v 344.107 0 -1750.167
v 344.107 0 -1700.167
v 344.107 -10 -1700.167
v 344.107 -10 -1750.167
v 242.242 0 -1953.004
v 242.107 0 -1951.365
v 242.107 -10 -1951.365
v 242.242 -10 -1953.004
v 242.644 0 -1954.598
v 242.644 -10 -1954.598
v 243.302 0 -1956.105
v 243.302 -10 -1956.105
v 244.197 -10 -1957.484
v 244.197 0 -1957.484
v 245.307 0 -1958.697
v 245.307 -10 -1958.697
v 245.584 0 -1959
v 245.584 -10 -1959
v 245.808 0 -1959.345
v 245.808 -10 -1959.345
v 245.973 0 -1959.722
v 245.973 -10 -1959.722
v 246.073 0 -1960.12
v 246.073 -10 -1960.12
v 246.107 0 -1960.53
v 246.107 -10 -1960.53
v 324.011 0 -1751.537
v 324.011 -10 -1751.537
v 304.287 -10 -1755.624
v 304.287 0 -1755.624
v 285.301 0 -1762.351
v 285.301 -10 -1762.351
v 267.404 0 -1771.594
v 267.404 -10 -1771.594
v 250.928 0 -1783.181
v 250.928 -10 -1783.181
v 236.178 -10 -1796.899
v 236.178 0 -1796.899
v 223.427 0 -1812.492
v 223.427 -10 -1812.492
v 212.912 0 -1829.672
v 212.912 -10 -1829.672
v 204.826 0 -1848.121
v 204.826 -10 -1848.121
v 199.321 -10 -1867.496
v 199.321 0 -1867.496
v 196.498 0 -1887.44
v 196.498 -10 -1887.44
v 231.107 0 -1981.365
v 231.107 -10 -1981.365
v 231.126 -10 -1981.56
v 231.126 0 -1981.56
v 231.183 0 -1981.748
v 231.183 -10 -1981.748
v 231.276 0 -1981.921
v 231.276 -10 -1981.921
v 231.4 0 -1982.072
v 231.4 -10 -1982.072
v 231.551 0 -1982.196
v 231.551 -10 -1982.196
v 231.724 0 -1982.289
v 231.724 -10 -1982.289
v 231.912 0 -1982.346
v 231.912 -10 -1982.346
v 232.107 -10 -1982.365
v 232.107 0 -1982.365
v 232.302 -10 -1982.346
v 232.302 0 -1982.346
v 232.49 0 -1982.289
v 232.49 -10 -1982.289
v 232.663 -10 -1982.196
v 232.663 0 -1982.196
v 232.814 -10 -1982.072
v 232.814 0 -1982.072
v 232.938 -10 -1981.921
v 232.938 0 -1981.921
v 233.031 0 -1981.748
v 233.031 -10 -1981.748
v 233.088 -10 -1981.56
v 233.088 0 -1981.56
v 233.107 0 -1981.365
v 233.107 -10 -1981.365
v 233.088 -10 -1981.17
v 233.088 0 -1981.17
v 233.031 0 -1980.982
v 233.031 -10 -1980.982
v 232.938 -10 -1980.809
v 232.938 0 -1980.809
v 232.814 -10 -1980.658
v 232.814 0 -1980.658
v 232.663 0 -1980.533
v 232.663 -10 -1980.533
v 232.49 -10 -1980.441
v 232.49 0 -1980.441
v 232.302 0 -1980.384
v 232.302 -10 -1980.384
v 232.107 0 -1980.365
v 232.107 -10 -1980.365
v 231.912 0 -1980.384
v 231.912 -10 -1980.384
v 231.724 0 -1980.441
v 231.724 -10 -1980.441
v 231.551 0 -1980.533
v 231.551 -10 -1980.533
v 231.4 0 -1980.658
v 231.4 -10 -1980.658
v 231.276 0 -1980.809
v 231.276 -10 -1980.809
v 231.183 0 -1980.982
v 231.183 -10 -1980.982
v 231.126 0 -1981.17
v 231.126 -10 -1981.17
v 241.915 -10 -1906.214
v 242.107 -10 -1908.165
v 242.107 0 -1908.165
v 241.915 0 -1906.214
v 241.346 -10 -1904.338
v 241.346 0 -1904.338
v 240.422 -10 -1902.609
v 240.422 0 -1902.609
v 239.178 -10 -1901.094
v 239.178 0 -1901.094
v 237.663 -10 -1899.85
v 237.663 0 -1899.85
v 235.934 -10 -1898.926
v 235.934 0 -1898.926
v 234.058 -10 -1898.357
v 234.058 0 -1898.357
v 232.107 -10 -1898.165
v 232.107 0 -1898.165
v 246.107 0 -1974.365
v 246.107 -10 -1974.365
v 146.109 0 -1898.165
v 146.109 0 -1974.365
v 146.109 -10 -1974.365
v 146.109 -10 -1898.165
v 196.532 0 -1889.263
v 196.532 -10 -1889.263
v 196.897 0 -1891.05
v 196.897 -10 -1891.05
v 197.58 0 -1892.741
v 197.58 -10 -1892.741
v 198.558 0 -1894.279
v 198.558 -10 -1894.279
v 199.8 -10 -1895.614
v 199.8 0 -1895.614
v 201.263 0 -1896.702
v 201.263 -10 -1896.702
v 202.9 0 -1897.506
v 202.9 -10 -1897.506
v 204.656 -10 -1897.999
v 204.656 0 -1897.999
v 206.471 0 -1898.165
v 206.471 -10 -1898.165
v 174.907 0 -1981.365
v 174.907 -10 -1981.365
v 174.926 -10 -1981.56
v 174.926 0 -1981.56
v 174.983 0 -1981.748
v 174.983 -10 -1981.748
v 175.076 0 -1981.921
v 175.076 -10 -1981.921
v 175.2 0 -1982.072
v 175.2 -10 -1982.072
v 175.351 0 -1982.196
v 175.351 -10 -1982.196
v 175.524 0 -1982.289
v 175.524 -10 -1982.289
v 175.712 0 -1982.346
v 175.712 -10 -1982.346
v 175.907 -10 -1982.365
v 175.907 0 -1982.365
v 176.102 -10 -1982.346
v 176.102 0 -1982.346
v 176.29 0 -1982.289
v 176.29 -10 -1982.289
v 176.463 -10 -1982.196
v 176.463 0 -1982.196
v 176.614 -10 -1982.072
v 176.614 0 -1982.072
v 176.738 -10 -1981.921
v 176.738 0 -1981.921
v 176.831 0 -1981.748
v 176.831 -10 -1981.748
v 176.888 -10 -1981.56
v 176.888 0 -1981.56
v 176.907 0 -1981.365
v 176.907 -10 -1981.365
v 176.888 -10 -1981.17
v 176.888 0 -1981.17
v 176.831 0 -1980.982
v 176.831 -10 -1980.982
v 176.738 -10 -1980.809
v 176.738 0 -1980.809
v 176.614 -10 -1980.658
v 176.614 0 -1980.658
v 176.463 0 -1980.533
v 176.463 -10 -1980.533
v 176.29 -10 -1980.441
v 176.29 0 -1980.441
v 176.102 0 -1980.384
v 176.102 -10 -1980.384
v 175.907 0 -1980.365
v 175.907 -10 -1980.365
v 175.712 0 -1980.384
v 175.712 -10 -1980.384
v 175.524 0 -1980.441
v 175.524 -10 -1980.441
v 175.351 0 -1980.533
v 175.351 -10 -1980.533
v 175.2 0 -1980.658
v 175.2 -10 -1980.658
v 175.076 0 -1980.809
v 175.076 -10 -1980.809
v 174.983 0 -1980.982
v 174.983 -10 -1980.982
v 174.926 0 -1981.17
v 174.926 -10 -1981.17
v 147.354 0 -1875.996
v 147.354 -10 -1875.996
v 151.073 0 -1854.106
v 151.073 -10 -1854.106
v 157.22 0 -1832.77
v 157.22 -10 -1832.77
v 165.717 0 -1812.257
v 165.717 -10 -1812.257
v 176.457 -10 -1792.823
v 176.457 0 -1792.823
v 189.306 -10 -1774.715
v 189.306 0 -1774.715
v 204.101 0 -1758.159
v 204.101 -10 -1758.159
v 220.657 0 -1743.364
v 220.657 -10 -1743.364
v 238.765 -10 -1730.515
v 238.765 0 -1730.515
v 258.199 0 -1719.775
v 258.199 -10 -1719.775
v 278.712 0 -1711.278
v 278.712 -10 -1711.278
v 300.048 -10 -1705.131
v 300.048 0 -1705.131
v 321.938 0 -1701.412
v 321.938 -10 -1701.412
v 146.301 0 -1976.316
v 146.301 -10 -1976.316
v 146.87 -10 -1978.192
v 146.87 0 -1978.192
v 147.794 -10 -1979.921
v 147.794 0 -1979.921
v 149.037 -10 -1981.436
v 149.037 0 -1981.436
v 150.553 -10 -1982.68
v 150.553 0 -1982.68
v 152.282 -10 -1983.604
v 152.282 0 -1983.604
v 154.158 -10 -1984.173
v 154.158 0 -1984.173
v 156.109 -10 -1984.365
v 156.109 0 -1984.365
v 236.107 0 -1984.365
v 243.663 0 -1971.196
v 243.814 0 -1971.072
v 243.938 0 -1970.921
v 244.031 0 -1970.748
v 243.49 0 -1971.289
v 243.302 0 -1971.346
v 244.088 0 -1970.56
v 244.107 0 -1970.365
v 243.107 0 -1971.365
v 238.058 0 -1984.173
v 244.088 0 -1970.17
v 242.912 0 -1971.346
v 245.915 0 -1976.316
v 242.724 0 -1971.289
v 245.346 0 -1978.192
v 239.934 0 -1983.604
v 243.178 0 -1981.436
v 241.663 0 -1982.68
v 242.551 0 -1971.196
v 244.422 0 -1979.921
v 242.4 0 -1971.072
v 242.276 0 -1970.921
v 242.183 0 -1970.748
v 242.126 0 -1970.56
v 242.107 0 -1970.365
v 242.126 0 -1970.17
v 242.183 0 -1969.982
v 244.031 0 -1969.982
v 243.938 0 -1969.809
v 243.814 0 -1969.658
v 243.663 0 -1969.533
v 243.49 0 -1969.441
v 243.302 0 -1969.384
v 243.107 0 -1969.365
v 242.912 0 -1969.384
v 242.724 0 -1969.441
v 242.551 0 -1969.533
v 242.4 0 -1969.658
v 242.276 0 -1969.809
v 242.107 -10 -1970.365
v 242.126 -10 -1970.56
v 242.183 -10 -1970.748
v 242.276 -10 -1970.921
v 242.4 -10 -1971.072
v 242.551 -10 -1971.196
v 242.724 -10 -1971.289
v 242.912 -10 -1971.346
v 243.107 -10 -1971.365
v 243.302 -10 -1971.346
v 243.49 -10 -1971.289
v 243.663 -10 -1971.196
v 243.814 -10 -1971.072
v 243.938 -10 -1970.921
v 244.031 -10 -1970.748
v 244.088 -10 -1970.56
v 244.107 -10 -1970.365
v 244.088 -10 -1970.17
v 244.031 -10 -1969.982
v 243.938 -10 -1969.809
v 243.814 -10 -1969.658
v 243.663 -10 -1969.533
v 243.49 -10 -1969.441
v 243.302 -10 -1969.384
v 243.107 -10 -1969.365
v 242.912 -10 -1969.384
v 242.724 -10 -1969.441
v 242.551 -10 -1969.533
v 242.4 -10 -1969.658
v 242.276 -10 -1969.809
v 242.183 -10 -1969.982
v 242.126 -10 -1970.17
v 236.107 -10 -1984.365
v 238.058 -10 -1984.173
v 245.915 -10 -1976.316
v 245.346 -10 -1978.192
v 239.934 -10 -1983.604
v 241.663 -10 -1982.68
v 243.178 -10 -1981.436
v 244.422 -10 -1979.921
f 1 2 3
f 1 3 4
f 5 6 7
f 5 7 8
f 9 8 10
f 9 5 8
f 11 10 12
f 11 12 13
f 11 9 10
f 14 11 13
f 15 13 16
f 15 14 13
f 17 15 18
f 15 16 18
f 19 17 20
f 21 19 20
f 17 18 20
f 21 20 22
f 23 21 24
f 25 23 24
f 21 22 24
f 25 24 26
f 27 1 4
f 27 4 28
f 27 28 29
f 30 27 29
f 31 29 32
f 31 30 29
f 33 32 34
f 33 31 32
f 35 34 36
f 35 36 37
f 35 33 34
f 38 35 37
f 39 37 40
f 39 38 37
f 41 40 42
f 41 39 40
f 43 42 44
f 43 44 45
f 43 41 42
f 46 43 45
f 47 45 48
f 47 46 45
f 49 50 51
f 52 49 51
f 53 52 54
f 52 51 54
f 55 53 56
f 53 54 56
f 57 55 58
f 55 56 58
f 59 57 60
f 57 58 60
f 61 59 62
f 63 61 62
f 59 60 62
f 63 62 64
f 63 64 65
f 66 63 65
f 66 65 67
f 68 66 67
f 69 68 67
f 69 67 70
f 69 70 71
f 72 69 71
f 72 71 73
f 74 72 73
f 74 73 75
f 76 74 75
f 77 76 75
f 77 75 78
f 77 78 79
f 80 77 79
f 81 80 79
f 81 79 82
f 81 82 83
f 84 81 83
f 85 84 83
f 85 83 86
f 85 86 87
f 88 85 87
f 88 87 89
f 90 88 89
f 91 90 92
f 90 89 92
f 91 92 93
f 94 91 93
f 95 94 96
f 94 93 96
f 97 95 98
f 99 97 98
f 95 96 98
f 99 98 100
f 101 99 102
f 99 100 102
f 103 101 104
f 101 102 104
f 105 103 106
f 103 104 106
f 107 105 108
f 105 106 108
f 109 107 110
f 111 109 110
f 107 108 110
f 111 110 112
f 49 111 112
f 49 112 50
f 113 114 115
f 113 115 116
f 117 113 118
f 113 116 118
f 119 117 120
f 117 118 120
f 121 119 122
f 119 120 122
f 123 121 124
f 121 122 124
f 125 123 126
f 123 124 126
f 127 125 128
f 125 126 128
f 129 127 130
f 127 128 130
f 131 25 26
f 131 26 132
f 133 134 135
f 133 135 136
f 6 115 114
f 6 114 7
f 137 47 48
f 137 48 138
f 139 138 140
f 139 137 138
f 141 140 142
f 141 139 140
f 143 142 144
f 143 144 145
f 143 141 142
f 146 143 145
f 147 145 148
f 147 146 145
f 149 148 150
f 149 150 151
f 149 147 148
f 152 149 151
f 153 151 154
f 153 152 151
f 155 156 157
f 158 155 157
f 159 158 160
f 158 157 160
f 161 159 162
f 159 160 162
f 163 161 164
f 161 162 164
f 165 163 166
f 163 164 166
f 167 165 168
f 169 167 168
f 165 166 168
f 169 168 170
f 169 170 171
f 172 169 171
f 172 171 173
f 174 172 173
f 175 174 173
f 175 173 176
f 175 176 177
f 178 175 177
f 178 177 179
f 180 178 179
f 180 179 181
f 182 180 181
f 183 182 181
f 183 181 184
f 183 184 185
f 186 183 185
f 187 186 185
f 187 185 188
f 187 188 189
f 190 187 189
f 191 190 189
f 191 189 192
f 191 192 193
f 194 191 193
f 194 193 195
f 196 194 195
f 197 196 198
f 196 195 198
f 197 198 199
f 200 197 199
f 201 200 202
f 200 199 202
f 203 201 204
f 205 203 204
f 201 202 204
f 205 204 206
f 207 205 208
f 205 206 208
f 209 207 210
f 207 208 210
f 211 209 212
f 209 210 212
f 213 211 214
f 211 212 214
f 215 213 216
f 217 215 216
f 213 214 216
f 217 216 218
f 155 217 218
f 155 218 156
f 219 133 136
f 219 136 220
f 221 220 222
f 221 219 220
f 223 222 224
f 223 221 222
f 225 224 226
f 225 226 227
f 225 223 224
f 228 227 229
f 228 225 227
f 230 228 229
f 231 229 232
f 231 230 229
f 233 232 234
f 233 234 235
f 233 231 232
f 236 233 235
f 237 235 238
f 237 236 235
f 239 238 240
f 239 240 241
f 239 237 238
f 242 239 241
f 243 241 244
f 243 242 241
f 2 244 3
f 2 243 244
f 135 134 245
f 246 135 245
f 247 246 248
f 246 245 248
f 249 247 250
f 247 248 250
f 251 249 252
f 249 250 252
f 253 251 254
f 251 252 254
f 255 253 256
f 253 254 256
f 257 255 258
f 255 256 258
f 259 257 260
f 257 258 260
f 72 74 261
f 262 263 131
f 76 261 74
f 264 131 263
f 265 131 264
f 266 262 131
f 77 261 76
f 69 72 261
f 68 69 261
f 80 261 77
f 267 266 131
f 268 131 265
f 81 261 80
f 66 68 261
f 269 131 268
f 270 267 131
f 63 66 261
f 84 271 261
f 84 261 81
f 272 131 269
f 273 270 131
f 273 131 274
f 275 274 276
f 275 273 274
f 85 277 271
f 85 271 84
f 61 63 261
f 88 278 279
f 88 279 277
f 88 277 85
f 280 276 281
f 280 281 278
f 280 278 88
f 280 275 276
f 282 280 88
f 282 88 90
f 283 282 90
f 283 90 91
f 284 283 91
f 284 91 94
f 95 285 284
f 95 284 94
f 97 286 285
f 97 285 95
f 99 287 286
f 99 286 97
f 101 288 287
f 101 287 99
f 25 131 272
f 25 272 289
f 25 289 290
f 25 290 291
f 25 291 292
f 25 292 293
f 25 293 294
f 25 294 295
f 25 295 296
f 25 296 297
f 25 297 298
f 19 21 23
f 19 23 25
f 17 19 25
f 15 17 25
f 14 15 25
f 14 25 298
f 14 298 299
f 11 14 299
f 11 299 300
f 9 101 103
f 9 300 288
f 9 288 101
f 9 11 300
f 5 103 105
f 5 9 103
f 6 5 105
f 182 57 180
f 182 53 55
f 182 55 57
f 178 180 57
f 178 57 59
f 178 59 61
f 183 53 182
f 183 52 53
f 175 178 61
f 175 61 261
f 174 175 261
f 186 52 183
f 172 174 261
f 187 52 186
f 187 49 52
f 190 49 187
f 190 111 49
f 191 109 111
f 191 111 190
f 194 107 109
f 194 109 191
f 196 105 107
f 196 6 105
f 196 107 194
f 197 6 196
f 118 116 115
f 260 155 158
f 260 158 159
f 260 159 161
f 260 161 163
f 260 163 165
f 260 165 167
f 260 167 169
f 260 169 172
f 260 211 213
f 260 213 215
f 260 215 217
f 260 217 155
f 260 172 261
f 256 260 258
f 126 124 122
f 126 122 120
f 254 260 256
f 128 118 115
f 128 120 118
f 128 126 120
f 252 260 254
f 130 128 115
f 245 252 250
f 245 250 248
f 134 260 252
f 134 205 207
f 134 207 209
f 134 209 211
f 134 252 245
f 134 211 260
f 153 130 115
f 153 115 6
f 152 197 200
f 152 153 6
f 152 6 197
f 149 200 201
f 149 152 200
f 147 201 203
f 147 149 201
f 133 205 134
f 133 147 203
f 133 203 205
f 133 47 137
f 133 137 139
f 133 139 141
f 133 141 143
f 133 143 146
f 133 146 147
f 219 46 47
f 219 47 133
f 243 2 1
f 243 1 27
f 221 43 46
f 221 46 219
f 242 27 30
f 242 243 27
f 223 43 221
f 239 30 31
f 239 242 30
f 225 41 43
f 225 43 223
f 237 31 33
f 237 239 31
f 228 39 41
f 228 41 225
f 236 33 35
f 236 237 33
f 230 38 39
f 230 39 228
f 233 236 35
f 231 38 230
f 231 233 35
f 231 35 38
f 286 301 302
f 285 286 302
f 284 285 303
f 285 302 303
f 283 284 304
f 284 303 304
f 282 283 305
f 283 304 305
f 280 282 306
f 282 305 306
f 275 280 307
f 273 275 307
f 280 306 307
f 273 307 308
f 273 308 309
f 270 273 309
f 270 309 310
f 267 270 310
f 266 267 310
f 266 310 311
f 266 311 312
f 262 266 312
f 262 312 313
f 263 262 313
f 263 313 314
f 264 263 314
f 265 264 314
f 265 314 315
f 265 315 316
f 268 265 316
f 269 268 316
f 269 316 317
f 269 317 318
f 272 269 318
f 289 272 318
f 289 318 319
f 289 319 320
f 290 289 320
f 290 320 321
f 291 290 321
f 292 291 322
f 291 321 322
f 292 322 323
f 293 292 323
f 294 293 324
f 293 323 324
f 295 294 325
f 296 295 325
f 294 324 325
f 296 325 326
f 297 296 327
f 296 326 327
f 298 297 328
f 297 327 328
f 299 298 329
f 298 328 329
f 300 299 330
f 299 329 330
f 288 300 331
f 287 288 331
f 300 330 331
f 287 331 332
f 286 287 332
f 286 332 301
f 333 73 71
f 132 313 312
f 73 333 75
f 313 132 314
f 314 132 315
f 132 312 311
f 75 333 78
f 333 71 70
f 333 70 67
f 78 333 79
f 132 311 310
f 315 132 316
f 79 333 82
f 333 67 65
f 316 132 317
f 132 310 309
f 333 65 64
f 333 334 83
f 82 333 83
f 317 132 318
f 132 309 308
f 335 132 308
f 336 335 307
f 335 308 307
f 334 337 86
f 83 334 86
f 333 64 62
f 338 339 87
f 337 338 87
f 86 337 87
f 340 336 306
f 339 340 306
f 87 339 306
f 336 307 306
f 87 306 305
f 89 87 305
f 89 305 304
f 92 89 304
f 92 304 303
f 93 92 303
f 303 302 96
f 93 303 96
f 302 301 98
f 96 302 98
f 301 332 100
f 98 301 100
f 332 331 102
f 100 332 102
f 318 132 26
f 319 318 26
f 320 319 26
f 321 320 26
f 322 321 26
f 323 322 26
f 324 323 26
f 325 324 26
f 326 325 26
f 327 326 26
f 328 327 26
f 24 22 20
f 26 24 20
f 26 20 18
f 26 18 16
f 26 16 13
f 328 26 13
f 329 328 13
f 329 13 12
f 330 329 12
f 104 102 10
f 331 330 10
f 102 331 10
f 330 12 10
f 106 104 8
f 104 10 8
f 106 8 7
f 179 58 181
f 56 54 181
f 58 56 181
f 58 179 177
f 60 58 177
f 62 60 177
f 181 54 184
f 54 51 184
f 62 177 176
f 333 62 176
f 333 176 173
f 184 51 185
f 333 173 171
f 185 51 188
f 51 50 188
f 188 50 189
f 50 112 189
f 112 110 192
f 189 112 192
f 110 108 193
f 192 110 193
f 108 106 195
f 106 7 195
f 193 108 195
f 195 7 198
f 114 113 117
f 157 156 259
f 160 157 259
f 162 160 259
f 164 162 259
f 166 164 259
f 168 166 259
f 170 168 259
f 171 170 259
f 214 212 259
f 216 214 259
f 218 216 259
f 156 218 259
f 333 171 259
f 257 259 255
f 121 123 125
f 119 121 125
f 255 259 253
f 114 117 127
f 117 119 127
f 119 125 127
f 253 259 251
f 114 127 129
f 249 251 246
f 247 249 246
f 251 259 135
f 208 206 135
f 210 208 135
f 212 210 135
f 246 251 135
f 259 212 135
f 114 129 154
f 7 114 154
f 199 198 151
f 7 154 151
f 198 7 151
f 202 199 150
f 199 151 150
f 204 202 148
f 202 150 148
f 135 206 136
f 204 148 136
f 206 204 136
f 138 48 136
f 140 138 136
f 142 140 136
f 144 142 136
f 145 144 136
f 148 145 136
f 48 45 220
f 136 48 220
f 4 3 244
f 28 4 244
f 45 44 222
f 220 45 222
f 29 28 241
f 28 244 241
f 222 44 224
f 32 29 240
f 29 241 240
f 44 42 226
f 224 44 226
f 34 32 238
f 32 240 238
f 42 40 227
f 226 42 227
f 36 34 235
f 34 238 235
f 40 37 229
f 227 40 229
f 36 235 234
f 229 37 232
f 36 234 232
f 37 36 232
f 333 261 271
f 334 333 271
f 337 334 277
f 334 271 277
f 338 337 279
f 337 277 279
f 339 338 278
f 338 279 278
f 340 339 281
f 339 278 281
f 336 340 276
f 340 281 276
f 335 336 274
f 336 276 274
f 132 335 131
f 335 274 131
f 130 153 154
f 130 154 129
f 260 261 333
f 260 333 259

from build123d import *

# Parameters (mm, degrees)
BOSS_EXTRUDE1_DEPTH   = 10
F_2_0MM_DOWEL_HOLE1_D = 2
FILLET1_R             = 10
FILLET2_R             = 2.5


with BuildPart() as part:
    # Sketch1 → Boss-Extrude1 (new body)
    with BuildSketch(Plane(origin=(0, 0, 0), x_dir=(1, 0, 0), z_dir=(0, 1, 0))):
        with BuildLine():
            Line((146.108539292, 1980.364966037), (146.108539292, 1898.164966235))
            ThreePointArc((146.108539292, 1898.164966235), (204.100938953, 1758.158928457), (344.106976731, 1700.166528796))
            Line((344.106976731, 1700.166528796), (344.106976731, 1750.166528796))
            ThreePointArc((344.106976731, 1750.166528796), (239.456278012, 1793.514267516), (196.108539292, 1898.164966235))
            Line((196.108539292, 1898.164966235), (242.106976731, 1898.164966235))
            Line((242.106976731, 1898.164966235), (242.106976731, 1959.364966037))
            Line((242.106976731, 1959.364966037), (246.106976731, 1959.364966037))
            Line((246.106976731, 1959.364966037), (246.106976731, 1984.364966037))
            Line((246.106976731, 1984.364966037), (146.108539292, 1984.364966037))
            Line((146.108539292, 1984.364966037), (146.108539292, 1980.364966037))
        make_face()
    extrude(amount=-BOSS_EXTRUDE1_DEPTH)

    # Ø2.0mm Dowel Hole1 (through all)
    with Locations(Plane(origin=(0, 0, 0), x_dir=(1, 0, 0), z_dir=(0, 1, 0))):
        with Locations((175.906976731, 1981.364966037), (232.106976731, 1981.364966037), (243.106976731, 1970.364966037)):
            Hole(F_2_0MM_DOWEL_HOLE1_D / 2)

    # Fillet1
    # the kernel refuses this fillet: 10 mm, written as the material it adds along each edge
    with BuildSketch(Plane(origin=(196.108539292, 0, -1898.164966235), x_dir=(0.03625613161983894, 0, 0.9993425303267969), z_dir=(0, -1, 0))) as fillet1_piece_1:
        with BuildLine():
            CenterArc((10.369140338, -9.993425303), FILLET1_R, 87.922221298, 94.155557404)
            Line((0.375715035, -10.355986619), (0, 0))
            ThreePointArc((0, 0), (5.365850827, 0.097304484), (10.731701655, 0))
        make_face()
    extrude(amount=10)
    with BuildSketch(Plane(origin=(242.106976731, 0, -1959.364966037), x_dir=(1, 0, 0), z_dir=(0, -1, 0))) as fillet1_piece_2:
        with BuildLine():
            CenterArc((10, 8), FILLET1_R, 180, 53.130102354)
            Line((0, 8), (0, 0))
            Line((0, 0), (4, 0))
        make_face()
    extrude(amount=10)
    # the kernel refuses this fillet: 10 mm, written as the material it takes off along each edge
    with BuildSketch(Plane(origin=(146.108539292, 25, -1984.364966037), x_dir=(0, 0, 1), z_dir=(0, -1, 0)), Plane(origin=(246.106976731, 25, -1984.364966037), x_dir=(-1, 0, 0), z_dir=(0, -1, 0))) as fillet1_2_piece_1:
        with BuildLine():
            CenterArc((FILLET1_R, -FILLET1_R), FILLET1_R, 90, 90)
            Line((0, -FILLET1_R), (0, 0))
            Line((0, 0), (FILLET1_R, 0))
        make_face()
    extrude(amount=60, mode=Mode.SUBTRACT)
    with BuildSketch(Plane(origin=(242.106976731, 25, -1898.164966235), x_dir=(-1, 0, 0), z_dir=(0, -1, 0))) as fillet1_2_piece_2:
        with BuildLine():
            CenterArc((FILLET1_R, FILLET1_R), FILLET1_R, 180, 90)
            Line((0, FILLET1_R), (0, 0))
            Line((0, 0), (FILLET1_R, 0))
        make_face()
    extrude(amount=60, mode=Mode.SUBTRACT)

    # Fillet2
    fillet2_edges = [part.edges().sort_by_distance(p)[0] for p in [
        (246.106976731, -5, -1959.364966037),
    ]]
    fillet(fillet2_edges, radius=FILLET2_R)


solid = part.part
